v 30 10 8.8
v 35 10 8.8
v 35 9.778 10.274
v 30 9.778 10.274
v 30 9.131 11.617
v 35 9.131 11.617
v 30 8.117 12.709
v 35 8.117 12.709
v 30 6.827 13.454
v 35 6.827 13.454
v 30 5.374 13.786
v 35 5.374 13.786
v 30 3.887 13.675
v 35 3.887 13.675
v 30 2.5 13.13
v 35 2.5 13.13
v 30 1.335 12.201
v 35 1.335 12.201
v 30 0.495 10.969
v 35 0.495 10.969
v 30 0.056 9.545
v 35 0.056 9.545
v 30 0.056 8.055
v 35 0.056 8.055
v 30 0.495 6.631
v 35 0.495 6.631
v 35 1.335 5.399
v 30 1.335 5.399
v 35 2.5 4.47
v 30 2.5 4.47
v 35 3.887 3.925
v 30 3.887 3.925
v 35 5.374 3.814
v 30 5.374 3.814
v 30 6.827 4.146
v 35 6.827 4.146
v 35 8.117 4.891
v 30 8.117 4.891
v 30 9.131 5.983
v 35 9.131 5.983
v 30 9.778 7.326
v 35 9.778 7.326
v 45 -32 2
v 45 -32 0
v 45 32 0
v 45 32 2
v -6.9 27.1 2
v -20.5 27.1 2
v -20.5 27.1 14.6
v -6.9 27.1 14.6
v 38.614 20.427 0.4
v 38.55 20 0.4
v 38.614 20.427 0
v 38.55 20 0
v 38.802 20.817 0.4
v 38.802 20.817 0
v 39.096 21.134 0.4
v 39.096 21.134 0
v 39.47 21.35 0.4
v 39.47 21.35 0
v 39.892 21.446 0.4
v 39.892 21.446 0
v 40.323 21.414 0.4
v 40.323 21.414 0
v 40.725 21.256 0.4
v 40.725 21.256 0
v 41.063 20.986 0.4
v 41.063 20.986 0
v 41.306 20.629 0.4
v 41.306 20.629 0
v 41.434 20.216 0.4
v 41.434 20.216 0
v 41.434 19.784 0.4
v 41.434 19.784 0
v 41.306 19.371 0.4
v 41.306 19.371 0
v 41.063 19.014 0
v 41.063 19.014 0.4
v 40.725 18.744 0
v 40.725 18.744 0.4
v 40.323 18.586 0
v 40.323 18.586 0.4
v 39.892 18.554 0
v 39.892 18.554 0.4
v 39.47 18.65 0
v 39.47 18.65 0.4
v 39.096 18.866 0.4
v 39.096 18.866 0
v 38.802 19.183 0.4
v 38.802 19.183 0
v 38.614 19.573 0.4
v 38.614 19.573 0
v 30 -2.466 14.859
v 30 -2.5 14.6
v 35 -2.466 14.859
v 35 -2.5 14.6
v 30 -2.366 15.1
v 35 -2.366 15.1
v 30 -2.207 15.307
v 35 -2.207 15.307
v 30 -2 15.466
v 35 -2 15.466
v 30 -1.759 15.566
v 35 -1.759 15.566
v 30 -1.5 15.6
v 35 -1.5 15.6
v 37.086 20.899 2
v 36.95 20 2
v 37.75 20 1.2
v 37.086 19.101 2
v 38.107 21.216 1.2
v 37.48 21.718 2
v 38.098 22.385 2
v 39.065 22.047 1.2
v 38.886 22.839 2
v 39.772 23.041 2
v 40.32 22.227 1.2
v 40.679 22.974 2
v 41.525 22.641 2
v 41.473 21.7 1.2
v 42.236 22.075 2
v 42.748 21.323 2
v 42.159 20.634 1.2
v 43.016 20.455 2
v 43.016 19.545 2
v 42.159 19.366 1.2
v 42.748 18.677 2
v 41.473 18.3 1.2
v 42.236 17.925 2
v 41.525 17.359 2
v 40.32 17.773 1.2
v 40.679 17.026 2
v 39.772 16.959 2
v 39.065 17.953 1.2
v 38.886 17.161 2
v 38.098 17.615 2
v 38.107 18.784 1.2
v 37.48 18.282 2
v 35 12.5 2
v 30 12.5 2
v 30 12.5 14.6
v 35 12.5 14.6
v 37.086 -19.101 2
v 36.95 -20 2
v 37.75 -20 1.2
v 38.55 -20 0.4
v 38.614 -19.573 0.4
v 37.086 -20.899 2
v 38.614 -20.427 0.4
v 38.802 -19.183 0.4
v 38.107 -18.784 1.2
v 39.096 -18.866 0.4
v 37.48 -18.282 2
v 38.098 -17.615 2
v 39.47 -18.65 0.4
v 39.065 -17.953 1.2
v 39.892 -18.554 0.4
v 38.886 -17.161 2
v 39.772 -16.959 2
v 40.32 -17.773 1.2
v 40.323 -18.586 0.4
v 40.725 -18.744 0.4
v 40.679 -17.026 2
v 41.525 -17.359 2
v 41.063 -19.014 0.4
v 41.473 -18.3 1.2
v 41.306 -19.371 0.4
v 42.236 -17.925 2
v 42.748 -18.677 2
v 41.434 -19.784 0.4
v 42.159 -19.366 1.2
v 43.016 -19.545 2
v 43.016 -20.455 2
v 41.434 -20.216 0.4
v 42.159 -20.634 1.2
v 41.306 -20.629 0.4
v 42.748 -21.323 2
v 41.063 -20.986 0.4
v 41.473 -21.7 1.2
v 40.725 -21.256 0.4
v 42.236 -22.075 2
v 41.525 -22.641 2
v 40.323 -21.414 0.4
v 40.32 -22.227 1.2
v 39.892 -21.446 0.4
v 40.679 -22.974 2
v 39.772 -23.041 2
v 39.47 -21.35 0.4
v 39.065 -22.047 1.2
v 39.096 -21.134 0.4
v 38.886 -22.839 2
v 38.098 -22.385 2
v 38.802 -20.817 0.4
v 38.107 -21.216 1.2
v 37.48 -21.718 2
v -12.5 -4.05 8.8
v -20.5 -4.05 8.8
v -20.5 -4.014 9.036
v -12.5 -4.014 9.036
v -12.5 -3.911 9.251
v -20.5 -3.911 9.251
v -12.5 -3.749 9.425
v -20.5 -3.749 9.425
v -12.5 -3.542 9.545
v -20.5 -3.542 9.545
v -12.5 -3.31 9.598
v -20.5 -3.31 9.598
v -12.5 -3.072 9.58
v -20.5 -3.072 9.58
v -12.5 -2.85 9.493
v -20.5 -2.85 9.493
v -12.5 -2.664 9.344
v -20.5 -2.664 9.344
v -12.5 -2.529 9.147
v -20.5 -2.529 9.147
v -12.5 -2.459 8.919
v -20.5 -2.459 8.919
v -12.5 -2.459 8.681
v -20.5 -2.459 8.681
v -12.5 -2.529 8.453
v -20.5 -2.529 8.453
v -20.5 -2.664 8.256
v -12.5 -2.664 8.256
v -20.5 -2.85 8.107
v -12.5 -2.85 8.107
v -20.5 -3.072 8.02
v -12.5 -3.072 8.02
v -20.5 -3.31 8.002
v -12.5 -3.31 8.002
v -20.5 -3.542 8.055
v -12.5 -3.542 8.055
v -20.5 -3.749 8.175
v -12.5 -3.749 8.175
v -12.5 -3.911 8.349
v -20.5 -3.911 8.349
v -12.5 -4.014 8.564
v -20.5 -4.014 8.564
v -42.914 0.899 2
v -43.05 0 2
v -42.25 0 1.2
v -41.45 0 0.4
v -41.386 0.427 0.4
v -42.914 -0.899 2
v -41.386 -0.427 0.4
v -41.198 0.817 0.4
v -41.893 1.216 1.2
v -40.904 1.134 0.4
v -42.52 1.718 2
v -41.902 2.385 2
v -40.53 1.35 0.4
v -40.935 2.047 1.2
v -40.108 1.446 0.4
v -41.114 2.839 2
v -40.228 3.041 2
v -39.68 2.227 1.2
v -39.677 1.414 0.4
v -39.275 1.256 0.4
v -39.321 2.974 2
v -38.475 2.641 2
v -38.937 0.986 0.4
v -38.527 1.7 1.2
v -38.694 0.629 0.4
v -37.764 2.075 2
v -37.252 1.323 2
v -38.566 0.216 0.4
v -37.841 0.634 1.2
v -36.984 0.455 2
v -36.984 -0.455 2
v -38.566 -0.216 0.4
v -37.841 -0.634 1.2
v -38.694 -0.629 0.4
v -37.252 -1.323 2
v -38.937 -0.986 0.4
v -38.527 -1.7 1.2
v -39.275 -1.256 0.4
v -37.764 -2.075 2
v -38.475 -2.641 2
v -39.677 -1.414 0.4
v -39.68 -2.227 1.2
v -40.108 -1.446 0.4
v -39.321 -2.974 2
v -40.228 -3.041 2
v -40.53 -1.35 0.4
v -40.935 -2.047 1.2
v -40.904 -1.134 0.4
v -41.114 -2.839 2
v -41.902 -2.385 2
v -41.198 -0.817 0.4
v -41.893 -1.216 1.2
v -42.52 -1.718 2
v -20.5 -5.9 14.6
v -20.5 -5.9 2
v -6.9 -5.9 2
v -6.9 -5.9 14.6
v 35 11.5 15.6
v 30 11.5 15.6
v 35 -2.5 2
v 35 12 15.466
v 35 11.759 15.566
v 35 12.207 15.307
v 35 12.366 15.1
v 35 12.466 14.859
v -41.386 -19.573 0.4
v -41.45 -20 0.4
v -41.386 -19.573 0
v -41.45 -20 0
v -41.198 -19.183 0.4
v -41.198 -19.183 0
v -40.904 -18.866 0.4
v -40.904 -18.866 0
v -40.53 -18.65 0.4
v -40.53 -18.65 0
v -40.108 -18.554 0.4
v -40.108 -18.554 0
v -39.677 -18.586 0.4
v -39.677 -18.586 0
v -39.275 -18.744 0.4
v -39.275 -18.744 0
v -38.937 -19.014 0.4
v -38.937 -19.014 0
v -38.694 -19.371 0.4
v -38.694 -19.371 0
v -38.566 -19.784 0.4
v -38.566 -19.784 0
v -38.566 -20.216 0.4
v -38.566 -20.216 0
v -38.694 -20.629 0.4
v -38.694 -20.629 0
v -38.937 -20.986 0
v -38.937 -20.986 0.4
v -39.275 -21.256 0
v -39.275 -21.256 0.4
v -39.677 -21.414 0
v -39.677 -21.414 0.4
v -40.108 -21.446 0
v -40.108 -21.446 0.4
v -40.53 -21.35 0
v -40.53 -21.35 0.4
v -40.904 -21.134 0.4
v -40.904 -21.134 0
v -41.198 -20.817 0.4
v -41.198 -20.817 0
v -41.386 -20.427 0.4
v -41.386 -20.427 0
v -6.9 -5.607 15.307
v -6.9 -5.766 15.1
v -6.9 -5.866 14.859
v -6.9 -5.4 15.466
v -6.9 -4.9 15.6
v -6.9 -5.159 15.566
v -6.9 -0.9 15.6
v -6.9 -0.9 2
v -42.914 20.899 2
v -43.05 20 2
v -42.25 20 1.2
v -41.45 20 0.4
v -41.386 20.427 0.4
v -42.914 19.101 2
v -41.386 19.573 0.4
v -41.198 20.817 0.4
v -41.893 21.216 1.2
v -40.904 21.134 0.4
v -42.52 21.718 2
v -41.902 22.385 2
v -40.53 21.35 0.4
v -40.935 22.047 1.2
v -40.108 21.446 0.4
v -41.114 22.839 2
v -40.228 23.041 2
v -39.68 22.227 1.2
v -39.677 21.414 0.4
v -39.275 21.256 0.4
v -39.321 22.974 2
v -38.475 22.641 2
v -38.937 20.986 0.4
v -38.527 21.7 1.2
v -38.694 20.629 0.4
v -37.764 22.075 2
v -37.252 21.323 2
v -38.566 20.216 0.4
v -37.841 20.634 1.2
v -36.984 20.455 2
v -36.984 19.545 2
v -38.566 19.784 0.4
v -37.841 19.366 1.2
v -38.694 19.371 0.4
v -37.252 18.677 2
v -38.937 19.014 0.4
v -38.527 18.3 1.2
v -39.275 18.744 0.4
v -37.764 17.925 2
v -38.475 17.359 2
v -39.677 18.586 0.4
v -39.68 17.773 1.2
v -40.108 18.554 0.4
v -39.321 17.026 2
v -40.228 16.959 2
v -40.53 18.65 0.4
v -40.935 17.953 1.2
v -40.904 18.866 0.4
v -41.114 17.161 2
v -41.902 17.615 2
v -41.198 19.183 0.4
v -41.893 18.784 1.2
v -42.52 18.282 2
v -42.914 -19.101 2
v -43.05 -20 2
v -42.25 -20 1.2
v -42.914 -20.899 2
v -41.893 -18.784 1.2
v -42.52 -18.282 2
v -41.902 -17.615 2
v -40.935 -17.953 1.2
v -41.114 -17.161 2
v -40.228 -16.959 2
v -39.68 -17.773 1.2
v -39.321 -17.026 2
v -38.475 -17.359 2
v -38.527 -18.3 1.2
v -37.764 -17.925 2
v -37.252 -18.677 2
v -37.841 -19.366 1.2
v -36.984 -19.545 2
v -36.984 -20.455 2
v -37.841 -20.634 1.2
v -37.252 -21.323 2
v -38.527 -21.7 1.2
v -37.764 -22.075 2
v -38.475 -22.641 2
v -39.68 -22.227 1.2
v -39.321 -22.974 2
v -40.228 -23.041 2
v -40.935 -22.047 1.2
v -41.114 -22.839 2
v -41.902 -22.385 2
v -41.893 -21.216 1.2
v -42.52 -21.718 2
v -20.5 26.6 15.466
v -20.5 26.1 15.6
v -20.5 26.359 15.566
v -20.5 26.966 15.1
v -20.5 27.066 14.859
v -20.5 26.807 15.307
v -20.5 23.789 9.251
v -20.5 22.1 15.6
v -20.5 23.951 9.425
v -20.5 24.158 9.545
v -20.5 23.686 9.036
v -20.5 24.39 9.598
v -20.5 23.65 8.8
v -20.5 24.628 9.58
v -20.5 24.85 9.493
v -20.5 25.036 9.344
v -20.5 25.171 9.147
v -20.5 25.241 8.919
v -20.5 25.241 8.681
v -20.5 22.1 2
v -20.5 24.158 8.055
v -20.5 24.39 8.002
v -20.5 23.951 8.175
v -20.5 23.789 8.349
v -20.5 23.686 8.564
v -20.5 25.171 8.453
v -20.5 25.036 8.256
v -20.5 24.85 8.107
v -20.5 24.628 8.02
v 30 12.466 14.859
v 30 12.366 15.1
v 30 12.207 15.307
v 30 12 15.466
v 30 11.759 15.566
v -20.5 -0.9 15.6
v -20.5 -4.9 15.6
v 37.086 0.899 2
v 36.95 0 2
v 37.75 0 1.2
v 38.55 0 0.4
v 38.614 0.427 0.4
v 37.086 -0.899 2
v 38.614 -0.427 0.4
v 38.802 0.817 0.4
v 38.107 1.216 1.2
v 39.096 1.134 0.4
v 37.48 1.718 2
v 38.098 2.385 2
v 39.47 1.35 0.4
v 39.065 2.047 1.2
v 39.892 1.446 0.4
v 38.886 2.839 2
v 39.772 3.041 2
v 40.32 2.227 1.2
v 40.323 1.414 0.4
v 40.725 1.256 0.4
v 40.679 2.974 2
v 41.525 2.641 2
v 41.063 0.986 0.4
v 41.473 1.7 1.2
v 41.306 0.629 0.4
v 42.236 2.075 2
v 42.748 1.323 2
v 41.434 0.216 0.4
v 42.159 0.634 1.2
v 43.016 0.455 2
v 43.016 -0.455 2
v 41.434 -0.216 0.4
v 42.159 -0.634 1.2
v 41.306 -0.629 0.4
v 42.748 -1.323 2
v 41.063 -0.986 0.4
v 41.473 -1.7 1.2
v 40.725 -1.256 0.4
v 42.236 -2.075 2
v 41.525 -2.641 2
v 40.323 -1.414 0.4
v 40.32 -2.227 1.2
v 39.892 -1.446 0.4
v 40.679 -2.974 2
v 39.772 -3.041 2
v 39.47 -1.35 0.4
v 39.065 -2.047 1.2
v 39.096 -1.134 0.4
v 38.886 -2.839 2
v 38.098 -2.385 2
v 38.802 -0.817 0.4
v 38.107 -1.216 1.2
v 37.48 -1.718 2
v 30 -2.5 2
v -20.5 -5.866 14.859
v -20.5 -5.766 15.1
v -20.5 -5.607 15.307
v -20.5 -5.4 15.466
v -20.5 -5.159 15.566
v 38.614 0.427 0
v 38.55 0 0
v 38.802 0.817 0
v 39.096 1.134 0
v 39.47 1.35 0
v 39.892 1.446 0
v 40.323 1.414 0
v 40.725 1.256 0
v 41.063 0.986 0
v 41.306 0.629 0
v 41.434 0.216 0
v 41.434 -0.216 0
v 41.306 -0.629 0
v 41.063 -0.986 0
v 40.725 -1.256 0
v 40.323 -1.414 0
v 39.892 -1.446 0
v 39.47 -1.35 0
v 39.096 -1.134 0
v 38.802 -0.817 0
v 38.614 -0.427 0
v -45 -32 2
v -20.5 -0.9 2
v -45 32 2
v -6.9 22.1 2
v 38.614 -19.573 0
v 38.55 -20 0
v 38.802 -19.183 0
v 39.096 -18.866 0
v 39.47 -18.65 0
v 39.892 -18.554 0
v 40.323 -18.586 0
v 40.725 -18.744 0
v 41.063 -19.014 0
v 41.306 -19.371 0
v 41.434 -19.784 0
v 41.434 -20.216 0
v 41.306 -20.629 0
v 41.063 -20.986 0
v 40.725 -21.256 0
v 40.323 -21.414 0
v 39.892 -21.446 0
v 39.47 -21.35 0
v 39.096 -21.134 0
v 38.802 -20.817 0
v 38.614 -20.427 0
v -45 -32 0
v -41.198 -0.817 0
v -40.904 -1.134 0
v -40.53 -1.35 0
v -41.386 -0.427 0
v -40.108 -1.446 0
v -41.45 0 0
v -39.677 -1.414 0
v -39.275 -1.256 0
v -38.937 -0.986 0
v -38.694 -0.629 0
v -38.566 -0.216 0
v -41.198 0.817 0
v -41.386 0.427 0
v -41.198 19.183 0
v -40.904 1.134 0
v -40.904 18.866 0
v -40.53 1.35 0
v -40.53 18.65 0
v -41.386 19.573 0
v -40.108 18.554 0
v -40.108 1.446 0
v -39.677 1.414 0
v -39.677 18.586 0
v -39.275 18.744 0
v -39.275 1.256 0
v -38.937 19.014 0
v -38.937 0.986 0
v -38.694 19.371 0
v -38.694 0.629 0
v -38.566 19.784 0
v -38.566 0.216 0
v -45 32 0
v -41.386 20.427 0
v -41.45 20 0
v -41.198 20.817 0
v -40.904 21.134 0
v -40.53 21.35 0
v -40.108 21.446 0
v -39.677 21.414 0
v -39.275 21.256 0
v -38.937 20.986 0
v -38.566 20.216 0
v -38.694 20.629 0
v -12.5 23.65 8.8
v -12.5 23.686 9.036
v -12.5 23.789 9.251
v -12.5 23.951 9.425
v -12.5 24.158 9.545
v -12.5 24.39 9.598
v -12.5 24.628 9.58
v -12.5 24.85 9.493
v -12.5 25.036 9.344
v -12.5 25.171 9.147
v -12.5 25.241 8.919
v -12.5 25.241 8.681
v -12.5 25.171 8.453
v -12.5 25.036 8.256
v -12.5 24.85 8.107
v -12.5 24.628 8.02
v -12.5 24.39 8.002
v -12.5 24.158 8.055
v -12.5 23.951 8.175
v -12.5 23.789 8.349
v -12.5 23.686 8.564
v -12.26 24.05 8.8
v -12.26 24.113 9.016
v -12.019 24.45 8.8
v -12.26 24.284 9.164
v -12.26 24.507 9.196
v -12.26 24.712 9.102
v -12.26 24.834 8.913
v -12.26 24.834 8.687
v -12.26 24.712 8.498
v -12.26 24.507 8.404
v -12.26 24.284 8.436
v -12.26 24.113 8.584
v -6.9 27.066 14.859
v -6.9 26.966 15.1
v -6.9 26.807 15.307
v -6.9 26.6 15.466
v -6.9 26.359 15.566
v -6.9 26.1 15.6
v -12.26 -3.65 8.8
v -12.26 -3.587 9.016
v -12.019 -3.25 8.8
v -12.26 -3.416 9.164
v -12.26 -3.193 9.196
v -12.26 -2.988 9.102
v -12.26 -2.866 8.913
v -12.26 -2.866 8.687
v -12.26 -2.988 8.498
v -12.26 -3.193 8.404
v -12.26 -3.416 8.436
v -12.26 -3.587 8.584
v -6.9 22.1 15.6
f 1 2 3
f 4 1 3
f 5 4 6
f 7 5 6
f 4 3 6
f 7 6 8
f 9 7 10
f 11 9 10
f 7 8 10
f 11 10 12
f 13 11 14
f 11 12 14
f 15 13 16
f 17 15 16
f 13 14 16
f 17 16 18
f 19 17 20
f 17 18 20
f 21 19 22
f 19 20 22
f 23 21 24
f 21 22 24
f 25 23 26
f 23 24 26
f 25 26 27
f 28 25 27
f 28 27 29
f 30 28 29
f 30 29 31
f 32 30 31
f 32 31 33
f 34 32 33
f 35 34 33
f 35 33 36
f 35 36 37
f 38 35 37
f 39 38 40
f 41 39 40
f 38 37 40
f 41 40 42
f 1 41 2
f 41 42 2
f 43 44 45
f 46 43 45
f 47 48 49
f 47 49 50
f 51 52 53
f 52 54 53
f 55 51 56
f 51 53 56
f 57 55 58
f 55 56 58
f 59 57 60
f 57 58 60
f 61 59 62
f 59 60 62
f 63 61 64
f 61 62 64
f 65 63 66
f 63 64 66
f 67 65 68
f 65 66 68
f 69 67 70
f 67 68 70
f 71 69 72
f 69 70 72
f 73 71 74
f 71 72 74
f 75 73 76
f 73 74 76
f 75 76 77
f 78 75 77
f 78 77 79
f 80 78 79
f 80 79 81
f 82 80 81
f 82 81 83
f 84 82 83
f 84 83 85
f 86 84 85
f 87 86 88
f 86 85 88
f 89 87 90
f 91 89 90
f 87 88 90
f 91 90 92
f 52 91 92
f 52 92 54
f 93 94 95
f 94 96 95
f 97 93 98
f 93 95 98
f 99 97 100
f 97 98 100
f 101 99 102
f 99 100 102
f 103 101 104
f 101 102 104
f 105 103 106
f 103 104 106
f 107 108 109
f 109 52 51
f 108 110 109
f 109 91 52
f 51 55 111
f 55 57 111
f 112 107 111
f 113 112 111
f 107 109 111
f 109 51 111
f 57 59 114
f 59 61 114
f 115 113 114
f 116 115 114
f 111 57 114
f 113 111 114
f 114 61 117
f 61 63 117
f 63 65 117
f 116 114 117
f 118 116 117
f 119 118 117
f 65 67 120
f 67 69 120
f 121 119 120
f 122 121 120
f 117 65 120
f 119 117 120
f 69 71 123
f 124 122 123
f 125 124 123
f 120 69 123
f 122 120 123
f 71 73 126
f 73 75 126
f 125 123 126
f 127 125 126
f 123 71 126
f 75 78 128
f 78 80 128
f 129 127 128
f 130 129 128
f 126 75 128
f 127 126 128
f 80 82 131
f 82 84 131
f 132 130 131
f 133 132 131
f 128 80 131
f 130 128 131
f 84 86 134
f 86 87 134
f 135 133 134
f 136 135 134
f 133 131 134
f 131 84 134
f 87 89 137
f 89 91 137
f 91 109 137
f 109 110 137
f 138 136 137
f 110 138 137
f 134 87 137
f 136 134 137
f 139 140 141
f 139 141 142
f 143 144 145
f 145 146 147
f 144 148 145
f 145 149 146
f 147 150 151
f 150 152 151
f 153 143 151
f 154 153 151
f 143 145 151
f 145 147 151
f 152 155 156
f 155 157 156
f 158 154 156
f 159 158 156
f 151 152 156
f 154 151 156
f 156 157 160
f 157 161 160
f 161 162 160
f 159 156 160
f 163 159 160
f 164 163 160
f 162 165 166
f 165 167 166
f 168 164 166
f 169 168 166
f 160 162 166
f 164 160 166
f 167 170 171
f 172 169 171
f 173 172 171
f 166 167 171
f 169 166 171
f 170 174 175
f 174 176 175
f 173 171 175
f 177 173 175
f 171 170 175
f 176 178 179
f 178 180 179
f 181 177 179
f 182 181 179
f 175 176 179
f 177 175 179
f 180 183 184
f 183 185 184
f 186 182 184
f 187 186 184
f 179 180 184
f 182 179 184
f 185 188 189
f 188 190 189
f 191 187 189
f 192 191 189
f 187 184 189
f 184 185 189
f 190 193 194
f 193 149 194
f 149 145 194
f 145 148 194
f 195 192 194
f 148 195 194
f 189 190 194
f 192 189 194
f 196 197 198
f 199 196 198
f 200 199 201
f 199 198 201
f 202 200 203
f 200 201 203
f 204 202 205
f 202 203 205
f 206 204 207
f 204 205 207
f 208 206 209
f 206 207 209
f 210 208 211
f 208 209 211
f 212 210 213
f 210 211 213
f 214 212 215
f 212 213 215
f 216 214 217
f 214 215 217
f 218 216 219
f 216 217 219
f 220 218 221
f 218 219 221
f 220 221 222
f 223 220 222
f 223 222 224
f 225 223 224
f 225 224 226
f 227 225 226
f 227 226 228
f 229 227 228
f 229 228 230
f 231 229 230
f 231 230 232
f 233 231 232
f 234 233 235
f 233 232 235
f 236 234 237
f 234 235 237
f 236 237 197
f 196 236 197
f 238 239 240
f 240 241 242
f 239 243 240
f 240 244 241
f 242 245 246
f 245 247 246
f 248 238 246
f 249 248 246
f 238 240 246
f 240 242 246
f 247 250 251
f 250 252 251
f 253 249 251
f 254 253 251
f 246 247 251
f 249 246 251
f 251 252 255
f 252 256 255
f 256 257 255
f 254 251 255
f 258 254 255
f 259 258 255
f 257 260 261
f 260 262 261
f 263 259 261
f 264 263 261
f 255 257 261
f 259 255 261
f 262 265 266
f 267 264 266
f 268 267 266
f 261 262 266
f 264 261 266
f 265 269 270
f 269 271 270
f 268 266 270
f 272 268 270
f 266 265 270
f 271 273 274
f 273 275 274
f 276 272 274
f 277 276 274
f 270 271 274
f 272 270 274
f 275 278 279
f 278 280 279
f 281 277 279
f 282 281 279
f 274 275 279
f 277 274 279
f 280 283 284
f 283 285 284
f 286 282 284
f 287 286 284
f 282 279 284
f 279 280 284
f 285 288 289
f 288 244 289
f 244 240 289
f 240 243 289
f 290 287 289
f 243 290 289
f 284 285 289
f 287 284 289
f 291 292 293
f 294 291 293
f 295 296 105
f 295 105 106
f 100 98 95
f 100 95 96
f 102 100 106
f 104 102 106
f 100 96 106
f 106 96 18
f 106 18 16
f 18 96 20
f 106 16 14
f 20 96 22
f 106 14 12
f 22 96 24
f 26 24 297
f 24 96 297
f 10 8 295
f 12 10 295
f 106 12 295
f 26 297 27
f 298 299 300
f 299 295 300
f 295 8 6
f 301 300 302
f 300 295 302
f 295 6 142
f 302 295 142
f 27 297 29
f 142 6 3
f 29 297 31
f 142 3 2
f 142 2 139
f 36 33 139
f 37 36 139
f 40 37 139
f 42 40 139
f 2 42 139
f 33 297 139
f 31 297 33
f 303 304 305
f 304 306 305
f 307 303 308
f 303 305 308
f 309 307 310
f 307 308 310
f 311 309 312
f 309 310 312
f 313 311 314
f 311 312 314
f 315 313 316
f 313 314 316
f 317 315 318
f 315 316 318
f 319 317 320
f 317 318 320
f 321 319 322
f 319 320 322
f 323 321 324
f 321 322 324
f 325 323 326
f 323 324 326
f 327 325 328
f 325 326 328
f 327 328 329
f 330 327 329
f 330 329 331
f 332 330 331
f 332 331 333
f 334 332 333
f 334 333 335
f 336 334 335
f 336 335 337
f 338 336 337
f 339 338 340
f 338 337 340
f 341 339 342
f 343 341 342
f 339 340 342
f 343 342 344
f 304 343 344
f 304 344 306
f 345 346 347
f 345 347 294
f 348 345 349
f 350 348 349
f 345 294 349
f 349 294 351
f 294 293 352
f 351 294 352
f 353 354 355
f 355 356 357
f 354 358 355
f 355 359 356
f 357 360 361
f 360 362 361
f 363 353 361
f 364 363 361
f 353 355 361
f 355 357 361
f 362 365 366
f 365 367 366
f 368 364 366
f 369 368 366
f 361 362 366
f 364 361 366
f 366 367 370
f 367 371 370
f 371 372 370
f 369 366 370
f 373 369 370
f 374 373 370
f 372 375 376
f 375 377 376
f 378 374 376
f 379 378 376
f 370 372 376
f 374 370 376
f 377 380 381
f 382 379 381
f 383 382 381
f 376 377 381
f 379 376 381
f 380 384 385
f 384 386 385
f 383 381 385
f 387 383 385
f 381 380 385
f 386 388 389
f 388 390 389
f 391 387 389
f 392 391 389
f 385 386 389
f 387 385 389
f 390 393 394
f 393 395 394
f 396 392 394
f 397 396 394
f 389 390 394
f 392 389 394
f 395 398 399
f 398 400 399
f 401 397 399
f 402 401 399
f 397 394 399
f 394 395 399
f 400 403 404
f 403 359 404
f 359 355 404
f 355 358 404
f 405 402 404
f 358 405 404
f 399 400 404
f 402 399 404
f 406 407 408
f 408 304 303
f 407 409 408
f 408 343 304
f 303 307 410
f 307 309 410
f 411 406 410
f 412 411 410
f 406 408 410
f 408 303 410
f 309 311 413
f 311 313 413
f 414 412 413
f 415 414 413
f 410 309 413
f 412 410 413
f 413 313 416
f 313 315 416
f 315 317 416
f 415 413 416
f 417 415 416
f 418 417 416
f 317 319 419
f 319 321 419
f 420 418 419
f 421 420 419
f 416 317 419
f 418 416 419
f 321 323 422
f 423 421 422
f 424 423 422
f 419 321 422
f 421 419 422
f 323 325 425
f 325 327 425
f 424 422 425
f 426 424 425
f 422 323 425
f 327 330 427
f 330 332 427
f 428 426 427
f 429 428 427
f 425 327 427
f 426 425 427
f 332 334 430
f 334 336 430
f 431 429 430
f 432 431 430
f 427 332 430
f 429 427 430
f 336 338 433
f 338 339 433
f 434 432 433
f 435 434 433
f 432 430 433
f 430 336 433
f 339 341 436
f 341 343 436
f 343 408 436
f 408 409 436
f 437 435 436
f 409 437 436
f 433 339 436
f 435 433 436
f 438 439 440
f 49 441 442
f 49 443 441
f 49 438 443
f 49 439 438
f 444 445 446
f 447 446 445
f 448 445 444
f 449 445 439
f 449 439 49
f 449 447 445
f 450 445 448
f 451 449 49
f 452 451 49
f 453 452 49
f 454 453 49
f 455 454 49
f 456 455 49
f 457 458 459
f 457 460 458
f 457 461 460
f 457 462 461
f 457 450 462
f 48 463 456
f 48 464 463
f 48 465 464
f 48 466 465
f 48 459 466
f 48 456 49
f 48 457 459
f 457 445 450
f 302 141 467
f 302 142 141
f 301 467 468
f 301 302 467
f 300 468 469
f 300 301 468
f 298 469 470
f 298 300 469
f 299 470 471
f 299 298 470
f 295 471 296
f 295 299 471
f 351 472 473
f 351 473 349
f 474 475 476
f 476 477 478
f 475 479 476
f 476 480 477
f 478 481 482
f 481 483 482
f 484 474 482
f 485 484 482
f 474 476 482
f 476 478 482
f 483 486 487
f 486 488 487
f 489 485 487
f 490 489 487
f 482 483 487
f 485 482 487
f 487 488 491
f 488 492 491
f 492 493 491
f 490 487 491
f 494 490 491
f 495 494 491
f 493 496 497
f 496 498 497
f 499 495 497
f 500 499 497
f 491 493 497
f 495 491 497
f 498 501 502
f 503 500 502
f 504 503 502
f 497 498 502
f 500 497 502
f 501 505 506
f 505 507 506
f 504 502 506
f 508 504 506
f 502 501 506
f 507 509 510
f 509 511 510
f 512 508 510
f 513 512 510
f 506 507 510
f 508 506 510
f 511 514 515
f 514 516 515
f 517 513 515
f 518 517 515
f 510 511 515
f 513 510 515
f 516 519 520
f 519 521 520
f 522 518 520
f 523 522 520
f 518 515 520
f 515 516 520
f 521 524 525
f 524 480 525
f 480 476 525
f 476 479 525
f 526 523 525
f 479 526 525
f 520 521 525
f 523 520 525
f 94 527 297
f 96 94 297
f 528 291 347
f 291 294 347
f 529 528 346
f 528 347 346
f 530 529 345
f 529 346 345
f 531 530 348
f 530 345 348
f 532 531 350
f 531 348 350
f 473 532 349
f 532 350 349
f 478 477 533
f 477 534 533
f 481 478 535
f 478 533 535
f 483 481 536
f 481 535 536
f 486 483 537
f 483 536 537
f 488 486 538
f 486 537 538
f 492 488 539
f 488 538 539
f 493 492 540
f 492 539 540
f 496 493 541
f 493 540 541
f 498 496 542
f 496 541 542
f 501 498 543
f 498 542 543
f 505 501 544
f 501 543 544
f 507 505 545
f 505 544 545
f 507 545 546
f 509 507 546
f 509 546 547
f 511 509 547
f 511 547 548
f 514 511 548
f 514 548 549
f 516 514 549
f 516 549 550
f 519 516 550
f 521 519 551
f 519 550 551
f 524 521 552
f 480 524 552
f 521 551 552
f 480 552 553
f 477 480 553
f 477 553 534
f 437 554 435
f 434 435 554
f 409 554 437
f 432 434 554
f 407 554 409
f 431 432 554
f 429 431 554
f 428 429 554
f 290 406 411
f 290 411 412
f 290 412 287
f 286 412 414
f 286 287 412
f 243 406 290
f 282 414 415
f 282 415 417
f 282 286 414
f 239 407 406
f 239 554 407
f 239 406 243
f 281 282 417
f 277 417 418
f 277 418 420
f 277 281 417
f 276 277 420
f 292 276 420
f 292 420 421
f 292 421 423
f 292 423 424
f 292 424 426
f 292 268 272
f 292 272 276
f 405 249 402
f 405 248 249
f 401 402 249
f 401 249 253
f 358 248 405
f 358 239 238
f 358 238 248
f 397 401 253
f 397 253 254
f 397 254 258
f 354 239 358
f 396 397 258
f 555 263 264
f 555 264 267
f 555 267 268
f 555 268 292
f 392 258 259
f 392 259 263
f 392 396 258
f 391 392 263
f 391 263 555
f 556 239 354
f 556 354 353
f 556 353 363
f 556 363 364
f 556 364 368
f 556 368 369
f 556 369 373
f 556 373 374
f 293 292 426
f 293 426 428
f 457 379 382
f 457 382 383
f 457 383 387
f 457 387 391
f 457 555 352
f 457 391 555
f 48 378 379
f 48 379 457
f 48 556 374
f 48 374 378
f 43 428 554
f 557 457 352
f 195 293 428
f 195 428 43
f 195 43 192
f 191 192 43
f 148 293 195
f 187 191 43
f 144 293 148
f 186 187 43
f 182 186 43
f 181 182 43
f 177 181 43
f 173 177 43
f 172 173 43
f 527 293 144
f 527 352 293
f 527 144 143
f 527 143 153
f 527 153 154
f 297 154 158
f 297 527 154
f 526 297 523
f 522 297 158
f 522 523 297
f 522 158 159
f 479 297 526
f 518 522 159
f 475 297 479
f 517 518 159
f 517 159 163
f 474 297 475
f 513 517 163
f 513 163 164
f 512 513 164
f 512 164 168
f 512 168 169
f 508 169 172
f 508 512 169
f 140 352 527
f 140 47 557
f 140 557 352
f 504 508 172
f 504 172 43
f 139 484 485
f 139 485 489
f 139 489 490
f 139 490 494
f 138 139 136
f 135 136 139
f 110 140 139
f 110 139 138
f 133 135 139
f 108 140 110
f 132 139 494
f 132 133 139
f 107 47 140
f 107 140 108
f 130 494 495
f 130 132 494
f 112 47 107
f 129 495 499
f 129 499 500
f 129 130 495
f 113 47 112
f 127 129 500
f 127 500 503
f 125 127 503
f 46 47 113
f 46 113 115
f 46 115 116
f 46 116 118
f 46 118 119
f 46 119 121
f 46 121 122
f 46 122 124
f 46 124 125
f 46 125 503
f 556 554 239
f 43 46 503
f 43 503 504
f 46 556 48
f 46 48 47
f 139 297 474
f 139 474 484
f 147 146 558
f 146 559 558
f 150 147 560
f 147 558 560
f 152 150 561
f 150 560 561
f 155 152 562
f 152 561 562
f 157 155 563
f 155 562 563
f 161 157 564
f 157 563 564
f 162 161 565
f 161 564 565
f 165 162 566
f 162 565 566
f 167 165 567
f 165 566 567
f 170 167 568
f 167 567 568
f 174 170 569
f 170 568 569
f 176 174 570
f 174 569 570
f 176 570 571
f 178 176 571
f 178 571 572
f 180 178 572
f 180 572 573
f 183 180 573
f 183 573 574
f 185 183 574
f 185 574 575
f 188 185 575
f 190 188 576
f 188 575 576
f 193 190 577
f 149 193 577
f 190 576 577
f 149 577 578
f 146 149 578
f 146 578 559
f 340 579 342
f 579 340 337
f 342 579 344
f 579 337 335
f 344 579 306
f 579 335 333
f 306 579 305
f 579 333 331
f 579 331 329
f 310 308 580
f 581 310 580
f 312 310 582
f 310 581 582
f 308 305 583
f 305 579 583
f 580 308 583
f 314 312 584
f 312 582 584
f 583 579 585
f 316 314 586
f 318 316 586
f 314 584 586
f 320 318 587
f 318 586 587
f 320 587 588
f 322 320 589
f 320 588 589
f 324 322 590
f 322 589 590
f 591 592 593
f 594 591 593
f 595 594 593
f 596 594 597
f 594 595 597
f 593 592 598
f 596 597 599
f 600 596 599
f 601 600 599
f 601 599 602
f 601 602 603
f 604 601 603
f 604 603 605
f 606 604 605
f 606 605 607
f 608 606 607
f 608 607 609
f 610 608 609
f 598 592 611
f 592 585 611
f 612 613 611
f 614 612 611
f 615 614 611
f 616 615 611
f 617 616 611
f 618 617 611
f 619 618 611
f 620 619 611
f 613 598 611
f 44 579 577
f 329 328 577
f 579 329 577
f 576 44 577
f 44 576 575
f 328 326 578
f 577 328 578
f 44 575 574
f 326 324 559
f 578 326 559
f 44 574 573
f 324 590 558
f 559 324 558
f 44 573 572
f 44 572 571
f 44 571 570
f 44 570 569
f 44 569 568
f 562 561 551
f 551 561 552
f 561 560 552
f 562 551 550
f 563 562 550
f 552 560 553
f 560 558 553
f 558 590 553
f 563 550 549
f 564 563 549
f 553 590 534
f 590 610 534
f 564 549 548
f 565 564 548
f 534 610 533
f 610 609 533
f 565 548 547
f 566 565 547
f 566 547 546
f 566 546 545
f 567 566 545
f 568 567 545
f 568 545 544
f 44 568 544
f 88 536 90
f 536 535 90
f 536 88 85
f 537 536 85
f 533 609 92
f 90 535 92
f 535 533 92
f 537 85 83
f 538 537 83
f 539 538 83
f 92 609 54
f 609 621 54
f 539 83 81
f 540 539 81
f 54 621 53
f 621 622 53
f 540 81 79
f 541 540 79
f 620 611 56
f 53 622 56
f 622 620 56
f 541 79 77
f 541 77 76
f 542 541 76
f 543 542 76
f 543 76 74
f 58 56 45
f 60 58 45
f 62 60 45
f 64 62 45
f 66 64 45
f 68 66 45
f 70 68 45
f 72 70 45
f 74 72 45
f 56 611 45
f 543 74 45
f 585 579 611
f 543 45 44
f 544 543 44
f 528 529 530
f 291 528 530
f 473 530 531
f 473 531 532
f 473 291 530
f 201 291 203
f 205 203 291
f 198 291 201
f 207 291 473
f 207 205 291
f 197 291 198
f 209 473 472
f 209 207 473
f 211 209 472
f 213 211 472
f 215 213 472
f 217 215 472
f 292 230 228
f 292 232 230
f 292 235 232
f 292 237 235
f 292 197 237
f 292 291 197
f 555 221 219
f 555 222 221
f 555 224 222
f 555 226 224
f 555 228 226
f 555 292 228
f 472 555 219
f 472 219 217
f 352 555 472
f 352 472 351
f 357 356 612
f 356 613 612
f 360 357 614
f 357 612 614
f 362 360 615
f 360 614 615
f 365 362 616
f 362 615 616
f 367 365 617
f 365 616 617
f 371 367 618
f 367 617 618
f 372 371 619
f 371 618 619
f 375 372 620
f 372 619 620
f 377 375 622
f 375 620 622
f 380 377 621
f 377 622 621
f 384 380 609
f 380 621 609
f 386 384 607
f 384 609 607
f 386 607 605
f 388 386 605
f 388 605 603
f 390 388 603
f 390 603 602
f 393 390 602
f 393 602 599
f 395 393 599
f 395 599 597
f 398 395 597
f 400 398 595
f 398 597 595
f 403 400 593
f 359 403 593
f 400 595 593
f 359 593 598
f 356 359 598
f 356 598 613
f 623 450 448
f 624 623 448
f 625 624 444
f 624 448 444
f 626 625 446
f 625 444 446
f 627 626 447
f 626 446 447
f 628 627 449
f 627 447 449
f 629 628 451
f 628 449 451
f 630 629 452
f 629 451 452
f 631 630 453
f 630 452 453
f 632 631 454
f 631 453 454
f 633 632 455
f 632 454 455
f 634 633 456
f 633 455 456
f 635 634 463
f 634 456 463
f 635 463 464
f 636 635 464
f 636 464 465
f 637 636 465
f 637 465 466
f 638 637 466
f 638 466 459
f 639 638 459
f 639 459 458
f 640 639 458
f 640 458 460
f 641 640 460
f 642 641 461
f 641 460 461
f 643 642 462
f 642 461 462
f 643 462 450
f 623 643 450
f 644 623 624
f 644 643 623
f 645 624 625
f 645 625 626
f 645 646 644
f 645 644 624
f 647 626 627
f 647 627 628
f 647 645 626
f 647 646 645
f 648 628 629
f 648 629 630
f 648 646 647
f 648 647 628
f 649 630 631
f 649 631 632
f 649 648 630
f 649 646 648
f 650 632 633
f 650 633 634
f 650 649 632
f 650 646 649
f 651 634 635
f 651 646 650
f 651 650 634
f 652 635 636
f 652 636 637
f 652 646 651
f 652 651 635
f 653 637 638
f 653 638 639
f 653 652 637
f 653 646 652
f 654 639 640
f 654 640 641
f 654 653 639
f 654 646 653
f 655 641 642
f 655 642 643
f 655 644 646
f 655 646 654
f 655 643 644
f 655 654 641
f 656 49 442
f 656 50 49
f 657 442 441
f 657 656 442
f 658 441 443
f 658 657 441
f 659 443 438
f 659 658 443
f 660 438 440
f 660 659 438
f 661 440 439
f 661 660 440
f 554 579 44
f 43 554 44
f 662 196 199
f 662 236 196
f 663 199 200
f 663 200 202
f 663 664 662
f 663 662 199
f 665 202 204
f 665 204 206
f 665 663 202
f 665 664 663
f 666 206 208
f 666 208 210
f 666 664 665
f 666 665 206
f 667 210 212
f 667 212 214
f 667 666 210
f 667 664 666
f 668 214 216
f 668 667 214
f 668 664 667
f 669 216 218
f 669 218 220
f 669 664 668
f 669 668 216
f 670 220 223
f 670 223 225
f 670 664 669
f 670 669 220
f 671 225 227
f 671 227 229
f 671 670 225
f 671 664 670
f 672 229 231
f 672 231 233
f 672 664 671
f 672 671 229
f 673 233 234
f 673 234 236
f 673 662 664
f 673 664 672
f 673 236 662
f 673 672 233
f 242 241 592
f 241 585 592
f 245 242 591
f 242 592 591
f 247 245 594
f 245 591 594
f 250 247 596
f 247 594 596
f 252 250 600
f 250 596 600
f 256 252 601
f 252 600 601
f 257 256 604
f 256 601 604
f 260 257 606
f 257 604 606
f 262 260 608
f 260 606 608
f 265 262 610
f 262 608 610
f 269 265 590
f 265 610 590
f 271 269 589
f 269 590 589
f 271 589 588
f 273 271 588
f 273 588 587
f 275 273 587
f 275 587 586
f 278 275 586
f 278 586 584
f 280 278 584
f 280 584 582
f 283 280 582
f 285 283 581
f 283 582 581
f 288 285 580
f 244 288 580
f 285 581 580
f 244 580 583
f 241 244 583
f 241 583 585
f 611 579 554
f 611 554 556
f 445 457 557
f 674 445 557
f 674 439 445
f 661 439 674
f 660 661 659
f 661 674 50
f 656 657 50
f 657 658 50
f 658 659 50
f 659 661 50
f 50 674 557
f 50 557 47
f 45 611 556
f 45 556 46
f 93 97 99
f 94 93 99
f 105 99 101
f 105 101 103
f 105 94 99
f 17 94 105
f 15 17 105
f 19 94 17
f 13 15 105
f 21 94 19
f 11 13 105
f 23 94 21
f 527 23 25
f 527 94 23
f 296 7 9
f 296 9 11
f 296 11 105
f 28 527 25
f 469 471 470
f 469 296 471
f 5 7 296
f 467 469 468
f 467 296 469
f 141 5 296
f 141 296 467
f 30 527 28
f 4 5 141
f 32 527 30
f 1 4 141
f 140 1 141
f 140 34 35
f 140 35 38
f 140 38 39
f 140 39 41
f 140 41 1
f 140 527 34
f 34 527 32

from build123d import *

# Parameters (mm, degrees)
SKETCH_W         = 90
SKETCH_H         = 64
PAD_DEPTH        = 2
HOLE_D           = 2.9
HOLE_DEPTH       = 25
HOLE_CSINK_D     = 6.1
HOLE_CSINK_ANGLE = 90
SKETCH002_W      = 13.6
SKETCH002_H      = 5
SKETCH002_W_2    = 5
SKETCH002_H_2    = 15
PAD001_DEPTH     = 13.6
SKETCH003_R      = 0.8
HOLE001_DEPTH    = 8
HOLE001_TIPS_R   = 0.8
SKETCH004_R      = 5
HOLE002_DEPTH    = 5
HOLE002_TIPS_R   = 5
FILLET_R         = 1


with BuildPart() as part:
    # Sketch → Pad (new body)
    with BuildSketch(Plane.XY):
        Rectangle(SKETCH_W, SKETCH_H)
    extrude(amount=PAD_DEPTH)

    # Hole
    with Locations(Plane.XY.offset(2)):
        with Locations((-40, 20), (-40, 0), (-40, -20), (40, 20), (40, 0), (40, -20)):
            CounterSinkHole(HOLE_D / 2, HOLE_CSINK_D / 2, depth=HOLE_DEPTH, counter_sink_angle=HOLE_CSINK_ANGLE)

    # Sketch002 (on Face6 of Pad) → Pad001 (join)
    with BuildSketch(Plane.XY.offset(2)):
        with Locations((-13.7, 24.6)):
            Rectangle(SKETCH002_W, SKETCH002_H)
        with Locations((-13.7, -3.4)):
            Rectangle(SKETCH002_W, SKETCH002_H)
        with Locations((32.5, 5)):
            Rectangle(SKETCH002_W_2, SKETCH002_H_2)
    extrude(amount=PAD001_DEPTH)

    # Sketch003 (on Face15 of Pad001) → Hole001 (cut)
    with BuildSketch(Plane(origin=(-20.5, 0, 0), x_dir=(0, -1, 0), z_dir=(-1, 0, 0))):
        with Locations((-24.45, 8.8)):
            Circle(SKETCH003_R)
        with Locations((3.25, 8.8)):
            Circle(SKETCH003_R)
    extrude(amount=-HOLE001_DEPTH, mode=Mode.SUBTRACT)

    # Hole001 tips → Hole001 tip 1 section 0
    with BuildSketch(Plane(origin=(-12.5, 0, 0), x_dir=(0, -1, 0), z_dir=(-1, 0, 0)), mode=Mode.PRIVATE) as hole001_tip_1_s0:
        with Locations((-24.45, 8.8)):
            Circle(HOLE001_TIPS_R)
    loft([hole001_tip_1_s0.sketch, Vertex(-12.019312, 24.45, 8.8)], mode=Mode.SUBTRACT)

    # Hole001 tips → Hole001 tip 2 section 0
    with BuildSketch(Plane(origin=(-12.5, 0, 0), x_dir=(0, -1, 0), z_dir=(-1, 0, 0)), mode=Mode.PRIVATE) as hole001_tip_2_s0:
        with Locations((3.25, 8.8)):
            Circle(HOLE001_TIPS_R)
    loft([hole001_tip_2_s0.sketch, Vertex(-12.019312, -3.25, 8.8)], mode=Mode.SUBTRACT)

    # Sketch004 (on Face28 of Hole001) → Hole002 (cut)
    with BuildSketch(Plane.YZ.offset(35)):
        with Locations((5, 8.8)):
            Circle(SKETCH004_R)
    extrude(amount=-HOLE002_DEPTH, mode=Mode.SUBTRACT)

    # Hole002 tips → Hole002 tip 1 section 0
    with BuildSketch(Plane.YZ.offset(30), mode=Mode.PRIVATE) as hole002_tip_1_s0:
        with Locations((5, 8.8)):
            Circle(HOLE002_TIPS_R)
    loft([hole002_tip_1_s0.sketch, Vertex(26.995697, 5, 8.8)], mode=Mode.SUBTRACT)

    # Fillet
    fillet_edges = [part.edges().sort_by_distance(p)[0] for p in [
        (32.5, -2.5, 15.6),
        (32.5, 12.5, 15.6),
        (-13.7, -5.9, 15.6),
        (-13.7, 27.1, 15.6),
    ]]
    fillet(fillet_edges, radius=FILLET_R)


solid = part.part
